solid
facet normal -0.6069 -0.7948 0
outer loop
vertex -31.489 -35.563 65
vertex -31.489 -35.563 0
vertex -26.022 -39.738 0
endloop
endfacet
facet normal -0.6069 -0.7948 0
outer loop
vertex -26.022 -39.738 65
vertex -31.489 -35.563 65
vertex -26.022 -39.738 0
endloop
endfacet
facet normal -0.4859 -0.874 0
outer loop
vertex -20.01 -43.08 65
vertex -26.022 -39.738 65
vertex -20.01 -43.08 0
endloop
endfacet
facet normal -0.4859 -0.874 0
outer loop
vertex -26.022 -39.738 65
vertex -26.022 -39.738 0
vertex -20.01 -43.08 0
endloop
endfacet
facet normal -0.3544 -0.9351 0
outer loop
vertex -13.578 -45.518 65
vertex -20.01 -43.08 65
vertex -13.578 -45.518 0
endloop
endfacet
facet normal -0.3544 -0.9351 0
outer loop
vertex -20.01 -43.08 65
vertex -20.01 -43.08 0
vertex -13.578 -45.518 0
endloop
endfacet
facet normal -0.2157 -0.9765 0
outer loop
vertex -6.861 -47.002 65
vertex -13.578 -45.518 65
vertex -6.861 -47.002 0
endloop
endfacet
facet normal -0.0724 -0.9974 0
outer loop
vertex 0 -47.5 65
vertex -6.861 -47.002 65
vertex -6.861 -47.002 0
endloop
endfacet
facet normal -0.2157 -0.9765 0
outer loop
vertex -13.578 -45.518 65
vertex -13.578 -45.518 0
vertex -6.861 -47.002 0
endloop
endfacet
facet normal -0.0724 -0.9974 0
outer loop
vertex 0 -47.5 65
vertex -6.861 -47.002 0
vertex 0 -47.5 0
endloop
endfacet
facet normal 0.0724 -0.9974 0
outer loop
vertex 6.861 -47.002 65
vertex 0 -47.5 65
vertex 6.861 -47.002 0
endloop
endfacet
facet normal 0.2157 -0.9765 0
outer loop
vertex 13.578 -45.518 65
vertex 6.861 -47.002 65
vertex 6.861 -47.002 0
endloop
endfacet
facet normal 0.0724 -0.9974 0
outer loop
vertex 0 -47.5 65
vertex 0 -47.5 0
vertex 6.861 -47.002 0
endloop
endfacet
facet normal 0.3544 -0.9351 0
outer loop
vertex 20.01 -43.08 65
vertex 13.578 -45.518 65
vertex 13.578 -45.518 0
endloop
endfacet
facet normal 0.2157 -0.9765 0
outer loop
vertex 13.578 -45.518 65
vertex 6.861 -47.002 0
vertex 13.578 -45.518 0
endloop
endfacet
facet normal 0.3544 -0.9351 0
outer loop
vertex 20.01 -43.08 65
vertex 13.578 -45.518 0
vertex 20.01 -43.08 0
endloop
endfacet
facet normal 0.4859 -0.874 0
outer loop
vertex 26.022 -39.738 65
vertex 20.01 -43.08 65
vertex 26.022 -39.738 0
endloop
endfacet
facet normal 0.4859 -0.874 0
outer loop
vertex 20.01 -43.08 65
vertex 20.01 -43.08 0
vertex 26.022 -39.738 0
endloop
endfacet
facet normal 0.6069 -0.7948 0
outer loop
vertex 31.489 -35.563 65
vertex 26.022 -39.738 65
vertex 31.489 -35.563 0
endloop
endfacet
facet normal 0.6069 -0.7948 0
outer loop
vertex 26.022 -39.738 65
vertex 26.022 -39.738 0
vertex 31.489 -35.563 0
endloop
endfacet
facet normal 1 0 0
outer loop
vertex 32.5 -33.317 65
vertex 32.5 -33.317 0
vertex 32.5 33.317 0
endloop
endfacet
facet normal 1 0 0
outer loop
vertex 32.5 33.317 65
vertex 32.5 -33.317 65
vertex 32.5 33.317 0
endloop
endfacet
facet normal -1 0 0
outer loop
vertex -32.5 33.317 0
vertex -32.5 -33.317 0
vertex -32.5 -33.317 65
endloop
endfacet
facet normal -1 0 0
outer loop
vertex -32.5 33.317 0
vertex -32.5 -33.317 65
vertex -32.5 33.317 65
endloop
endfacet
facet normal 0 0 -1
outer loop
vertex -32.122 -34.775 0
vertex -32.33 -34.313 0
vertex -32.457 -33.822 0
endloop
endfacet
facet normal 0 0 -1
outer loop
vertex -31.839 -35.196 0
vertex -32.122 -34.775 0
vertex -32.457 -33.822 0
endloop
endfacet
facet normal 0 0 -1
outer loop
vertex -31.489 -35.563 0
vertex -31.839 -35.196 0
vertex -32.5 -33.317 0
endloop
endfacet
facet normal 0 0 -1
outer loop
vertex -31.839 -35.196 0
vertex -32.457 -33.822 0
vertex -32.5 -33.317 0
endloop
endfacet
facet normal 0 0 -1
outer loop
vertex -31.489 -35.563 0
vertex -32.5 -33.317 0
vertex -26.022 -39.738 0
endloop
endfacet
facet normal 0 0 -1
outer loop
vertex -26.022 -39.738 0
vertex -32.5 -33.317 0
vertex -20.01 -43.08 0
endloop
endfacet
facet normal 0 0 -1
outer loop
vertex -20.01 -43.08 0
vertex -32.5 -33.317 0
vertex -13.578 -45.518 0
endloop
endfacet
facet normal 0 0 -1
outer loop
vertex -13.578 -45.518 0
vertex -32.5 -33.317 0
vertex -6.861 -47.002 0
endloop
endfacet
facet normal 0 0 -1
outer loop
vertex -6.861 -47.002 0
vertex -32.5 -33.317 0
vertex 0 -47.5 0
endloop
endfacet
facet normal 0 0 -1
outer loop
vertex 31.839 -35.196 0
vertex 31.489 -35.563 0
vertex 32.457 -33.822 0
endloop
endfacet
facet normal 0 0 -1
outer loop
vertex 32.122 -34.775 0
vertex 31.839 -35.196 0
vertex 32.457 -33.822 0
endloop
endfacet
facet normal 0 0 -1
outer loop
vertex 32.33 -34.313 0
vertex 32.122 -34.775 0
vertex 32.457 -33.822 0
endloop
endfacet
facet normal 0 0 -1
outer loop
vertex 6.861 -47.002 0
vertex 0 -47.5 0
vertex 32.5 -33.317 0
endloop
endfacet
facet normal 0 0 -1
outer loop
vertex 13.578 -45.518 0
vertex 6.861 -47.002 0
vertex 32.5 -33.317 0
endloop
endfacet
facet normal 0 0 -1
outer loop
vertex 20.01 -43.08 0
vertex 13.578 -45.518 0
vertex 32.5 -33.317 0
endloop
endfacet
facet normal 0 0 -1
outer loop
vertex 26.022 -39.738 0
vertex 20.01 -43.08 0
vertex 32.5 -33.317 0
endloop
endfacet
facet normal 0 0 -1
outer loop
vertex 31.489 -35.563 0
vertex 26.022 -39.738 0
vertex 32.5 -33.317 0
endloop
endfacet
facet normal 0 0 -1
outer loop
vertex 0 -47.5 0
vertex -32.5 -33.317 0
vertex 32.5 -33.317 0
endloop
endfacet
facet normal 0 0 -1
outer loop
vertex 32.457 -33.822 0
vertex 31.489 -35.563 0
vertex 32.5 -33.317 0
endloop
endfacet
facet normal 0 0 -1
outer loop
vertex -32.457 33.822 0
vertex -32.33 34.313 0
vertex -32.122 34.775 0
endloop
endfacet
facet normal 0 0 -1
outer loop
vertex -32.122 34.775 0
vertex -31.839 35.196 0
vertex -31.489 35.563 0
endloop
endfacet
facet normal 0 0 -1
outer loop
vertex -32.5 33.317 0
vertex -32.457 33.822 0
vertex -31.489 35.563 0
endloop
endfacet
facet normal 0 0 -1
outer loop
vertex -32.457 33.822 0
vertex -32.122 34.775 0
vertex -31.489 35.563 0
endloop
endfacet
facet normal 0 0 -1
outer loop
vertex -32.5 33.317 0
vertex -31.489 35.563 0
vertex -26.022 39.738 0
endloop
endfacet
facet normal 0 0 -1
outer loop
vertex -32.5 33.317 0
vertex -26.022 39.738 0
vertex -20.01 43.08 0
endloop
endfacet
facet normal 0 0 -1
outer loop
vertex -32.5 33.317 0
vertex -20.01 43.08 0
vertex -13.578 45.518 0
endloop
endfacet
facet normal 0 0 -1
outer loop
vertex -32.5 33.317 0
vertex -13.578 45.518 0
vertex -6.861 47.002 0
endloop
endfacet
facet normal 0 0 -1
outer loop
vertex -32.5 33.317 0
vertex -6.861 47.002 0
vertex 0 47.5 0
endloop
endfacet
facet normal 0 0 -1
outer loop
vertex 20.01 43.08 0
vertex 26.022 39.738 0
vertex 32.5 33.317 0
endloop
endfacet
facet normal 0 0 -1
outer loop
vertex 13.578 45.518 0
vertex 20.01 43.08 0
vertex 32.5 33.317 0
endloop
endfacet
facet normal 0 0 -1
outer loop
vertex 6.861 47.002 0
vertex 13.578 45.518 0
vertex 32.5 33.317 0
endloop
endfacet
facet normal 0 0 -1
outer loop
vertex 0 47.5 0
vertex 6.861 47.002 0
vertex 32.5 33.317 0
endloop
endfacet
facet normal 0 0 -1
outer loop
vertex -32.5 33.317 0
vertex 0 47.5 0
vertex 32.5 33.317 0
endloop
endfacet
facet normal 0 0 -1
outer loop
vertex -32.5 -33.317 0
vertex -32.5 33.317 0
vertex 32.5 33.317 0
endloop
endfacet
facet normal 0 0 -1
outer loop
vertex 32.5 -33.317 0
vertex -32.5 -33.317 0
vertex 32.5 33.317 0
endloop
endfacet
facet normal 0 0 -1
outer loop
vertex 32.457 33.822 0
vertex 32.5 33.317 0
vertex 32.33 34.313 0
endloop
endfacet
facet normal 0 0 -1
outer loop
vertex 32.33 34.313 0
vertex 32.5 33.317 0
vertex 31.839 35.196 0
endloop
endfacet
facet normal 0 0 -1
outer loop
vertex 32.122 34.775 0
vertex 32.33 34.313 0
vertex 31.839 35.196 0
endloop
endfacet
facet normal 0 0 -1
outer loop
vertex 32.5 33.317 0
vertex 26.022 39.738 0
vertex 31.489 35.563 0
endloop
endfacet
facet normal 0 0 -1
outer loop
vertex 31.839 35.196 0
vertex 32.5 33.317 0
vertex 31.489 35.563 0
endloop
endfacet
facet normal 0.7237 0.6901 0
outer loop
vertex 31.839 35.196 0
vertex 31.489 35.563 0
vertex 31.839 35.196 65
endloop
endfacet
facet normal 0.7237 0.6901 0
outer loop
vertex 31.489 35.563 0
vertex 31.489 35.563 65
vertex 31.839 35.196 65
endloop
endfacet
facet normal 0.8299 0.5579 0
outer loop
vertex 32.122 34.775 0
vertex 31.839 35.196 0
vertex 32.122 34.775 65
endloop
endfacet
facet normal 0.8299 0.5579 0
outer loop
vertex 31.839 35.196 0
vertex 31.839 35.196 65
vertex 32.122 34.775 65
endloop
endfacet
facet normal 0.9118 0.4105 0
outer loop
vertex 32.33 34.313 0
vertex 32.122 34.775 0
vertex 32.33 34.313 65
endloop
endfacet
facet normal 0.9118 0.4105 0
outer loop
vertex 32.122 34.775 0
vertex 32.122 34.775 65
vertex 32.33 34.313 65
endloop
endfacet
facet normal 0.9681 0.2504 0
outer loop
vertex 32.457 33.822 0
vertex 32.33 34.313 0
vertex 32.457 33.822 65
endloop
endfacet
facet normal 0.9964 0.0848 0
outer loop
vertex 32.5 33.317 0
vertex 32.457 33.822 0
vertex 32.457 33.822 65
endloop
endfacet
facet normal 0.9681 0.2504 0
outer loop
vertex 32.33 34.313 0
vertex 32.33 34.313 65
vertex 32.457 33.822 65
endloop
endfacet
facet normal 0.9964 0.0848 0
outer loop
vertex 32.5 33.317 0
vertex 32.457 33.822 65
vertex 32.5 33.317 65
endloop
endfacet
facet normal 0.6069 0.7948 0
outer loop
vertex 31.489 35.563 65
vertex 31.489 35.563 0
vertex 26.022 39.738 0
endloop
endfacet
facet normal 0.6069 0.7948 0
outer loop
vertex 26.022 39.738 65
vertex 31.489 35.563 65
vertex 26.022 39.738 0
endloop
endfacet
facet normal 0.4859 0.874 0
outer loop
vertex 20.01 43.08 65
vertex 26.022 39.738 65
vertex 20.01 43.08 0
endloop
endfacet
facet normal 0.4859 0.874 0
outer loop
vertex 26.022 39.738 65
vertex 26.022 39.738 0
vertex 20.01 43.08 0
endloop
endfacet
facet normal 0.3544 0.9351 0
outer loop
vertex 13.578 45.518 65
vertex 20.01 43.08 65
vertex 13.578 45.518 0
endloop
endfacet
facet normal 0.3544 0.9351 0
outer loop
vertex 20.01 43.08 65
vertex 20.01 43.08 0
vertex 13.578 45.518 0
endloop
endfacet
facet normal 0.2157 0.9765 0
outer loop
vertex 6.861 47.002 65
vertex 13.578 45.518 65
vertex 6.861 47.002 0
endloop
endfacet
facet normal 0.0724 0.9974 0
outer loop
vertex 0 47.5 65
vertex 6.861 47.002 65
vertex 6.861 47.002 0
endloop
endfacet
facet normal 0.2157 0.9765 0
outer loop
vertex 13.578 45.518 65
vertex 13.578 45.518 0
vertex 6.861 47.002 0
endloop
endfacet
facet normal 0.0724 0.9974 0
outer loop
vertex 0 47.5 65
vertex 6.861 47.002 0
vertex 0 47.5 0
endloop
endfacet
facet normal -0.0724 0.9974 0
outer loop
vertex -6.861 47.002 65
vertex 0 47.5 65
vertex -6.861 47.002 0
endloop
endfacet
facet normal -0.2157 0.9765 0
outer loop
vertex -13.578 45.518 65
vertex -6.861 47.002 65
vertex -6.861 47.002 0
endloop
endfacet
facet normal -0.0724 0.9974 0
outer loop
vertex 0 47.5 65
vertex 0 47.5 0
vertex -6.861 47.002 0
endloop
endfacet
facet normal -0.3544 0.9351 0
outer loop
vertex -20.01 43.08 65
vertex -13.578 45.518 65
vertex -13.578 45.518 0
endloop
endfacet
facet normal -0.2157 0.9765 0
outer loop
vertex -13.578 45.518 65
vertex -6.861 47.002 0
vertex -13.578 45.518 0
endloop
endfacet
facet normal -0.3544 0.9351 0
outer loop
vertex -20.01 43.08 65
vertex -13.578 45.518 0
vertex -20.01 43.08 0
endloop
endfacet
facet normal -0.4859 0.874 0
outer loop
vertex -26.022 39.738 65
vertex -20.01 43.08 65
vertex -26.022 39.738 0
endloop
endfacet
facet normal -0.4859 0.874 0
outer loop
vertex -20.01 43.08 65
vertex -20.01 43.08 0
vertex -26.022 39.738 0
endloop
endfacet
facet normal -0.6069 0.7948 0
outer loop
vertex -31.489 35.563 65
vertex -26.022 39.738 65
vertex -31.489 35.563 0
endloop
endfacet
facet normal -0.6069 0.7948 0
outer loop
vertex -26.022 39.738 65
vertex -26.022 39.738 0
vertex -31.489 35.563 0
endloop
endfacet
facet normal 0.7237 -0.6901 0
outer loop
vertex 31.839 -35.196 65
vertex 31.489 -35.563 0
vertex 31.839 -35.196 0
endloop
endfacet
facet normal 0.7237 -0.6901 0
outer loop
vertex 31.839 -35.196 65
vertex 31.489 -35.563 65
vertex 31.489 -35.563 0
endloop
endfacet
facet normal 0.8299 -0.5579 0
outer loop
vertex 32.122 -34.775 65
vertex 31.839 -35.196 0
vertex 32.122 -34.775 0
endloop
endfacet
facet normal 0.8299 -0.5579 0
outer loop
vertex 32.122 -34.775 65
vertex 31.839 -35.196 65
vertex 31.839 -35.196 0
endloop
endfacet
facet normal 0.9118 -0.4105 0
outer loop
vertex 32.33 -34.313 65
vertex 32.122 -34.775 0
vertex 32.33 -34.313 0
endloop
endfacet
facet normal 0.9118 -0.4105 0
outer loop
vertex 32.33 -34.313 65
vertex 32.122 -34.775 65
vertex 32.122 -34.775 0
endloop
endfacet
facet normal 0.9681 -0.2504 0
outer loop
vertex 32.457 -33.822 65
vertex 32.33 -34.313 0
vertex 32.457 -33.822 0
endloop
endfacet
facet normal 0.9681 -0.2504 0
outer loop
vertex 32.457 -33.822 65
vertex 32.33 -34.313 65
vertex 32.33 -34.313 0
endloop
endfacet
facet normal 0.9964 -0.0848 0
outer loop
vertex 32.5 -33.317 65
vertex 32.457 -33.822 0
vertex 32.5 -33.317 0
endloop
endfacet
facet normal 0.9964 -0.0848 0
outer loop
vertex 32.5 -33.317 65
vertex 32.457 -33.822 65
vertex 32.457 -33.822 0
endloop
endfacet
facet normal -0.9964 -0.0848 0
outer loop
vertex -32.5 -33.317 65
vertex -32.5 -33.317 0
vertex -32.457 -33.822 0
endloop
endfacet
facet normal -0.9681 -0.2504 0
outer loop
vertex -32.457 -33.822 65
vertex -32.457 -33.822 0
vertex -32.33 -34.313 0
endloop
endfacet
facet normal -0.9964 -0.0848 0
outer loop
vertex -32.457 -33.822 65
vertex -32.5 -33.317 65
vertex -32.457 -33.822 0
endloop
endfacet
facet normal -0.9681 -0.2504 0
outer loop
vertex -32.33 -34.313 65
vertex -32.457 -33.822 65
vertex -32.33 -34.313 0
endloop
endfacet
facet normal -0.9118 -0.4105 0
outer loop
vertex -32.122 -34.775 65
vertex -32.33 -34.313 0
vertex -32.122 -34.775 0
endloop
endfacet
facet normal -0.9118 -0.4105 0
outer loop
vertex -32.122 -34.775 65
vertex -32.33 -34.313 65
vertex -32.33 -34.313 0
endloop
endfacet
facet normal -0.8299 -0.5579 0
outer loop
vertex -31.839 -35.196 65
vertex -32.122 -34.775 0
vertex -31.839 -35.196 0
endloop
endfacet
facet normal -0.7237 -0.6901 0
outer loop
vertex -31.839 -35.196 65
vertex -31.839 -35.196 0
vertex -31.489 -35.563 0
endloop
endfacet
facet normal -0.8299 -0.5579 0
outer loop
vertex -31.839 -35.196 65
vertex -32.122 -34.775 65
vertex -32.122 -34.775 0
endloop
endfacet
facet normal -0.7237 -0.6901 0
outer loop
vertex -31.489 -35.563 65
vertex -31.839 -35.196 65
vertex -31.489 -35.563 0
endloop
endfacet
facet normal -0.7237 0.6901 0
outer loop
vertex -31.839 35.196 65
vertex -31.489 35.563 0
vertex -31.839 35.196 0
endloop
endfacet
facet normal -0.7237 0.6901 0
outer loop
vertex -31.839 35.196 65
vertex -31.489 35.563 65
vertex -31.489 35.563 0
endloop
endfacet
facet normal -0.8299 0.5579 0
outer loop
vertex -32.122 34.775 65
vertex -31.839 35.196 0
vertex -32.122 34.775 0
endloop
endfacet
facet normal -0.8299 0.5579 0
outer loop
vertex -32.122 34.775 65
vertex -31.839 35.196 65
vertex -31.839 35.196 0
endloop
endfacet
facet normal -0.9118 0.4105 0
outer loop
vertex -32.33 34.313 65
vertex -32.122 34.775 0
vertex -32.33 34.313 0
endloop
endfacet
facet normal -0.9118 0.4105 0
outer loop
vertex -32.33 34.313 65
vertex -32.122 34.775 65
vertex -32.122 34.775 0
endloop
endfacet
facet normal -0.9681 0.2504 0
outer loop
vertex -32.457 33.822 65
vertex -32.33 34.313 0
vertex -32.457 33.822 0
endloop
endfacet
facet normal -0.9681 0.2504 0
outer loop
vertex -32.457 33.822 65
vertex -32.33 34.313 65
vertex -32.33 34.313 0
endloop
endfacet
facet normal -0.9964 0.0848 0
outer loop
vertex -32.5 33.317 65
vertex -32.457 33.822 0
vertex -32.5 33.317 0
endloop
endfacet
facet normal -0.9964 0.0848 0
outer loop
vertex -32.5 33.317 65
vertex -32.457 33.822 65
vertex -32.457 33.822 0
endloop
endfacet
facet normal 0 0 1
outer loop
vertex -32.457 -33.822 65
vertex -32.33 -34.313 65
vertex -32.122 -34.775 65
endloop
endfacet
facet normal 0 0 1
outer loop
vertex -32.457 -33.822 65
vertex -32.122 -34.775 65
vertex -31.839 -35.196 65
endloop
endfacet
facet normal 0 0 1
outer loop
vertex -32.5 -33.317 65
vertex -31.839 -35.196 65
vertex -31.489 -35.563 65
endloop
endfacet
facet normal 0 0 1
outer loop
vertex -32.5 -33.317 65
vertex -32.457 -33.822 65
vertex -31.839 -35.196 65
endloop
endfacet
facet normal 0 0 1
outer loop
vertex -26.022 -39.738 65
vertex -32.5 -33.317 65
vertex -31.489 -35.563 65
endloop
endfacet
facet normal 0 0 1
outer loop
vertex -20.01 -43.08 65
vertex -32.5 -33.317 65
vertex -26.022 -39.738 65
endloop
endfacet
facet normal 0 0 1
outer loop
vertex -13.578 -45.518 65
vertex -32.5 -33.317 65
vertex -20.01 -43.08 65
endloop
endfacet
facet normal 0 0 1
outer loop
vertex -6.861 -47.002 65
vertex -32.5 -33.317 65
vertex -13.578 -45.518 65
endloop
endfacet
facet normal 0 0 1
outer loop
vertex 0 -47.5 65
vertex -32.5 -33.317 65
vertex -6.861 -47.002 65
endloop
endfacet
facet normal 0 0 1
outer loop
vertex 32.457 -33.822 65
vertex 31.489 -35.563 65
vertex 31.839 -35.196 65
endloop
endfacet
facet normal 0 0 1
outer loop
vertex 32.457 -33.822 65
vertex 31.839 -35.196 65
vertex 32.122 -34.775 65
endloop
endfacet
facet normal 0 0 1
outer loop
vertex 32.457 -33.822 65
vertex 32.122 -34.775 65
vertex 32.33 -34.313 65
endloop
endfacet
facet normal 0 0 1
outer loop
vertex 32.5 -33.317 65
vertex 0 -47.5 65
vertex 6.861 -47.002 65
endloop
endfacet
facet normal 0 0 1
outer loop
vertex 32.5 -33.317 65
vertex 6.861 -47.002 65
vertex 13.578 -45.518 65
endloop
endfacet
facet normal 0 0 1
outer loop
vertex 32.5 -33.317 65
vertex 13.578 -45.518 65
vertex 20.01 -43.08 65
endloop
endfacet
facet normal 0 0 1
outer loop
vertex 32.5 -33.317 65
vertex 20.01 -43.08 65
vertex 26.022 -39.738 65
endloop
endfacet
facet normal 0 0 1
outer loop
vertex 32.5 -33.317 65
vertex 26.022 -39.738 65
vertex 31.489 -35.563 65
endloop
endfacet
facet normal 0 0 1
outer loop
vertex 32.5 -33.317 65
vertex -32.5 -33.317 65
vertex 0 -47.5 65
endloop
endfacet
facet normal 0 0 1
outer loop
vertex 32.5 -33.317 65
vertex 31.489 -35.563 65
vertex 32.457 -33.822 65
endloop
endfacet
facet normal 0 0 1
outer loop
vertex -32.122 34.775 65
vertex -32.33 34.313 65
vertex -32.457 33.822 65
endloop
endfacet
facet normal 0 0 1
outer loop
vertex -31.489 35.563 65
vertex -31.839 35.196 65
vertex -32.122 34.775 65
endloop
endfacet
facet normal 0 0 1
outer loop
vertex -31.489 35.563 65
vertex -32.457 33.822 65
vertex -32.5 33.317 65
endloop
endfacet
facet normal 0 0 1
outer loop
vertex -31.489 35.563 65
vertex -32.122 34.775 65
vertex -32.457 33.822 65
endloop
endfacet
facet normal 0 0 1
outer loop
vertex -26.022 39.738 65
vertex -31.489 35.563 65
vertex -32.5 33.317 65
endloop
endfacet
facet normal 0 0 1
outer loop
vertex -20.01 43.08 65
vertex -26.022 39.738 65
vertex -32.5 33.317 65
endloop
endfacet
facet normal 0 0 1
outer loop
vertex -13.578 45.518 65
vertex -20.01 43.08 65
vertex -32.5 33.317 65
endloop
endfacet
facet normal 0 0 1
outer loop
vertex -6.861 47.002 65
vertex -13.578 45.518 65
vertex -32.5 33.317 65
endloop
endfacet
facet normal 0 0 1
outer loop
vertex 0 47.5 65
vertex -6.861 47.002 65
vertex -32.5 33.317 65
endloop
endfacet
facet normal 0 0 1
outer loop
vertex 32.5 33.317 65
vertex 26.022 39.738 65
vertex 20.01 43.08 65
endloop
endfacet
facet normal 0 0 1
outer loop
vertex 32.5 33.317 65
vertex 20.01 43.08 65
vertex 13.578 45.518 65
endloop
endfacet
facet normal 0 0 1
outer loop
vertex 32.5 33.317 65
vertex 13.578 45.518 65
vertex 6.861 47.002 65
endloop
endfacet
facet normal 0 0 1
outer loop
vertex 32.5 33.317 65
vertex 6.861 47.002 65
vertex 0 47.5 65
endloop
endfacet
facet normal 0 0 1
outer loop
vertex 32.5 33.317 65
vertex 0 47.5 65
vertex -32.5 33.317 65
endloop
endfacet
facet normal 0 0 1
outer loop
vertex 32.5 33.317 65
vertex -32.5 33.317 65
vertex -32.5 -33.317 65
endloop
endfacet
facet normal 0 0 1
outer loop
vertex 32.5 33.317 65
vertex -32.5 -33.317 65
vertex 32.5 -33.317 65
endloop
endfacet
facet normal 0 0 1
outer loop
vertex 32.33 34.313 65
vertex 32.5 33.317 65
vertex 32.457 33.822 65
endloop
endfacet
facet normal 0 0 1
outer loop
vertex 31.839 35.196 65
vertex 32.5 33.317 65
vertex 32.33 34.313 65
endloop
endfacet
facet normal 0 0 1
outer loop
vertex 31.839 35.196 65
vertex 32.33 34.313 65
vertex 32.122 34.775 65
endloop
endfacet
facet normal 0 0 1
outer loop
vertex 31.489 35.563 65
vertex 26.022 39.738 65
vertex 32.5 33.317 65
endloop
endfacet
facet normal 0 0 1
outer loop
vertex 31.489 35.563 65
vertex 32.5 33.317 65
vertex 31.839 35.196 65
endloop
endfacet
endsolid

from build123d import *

# Parameters (mm, degrees)
SKETCH_1_W      = 65
SKETCH_1_H      = 69.282032302
EXTRUDE_1_DEPTH = 65
FILLET_2_R      = 3


with BuildPart() as part:
    # Эскиз1 → Бобышка-Вытянуть1 (new body)
    with BuildSketch(Plane.XY):
        with BuildLine():
            Line((-32.5, 34.641016151), (32.5, 34.641016151))
            ThreePointArc((32.5, 34.641016151), (0, 47.5), (-32.5, 34.641016151))
        make_face()
        Rectangle(SKETCH_1_W, SKETCH_1_H)
        with BuildLine():
            ThreePointArc((-32.5, -34.641016151), (0, -47.5), (32.5, -34.641016151))
            Line((32.5, -34.641016151), (-32.5, -34.641016151))
        make_face()
    extrude(amount=EXTRUDE_1_DEPTH)

    # Скругление2
    fillet_2_edges = [part.edges().sort_by_distance(p)[0] for p in [
        (32.5, 34.641016151, 32.5),
        (32.5, -34.641016151, 32.5),
        (-32.5, -34.641016151, 32.5),
        (-32.5, 34.641016151, 32.5),
    ]]
    fillet(fillet_2_edges, radius=FILLET_2_R)


solid = part.part
